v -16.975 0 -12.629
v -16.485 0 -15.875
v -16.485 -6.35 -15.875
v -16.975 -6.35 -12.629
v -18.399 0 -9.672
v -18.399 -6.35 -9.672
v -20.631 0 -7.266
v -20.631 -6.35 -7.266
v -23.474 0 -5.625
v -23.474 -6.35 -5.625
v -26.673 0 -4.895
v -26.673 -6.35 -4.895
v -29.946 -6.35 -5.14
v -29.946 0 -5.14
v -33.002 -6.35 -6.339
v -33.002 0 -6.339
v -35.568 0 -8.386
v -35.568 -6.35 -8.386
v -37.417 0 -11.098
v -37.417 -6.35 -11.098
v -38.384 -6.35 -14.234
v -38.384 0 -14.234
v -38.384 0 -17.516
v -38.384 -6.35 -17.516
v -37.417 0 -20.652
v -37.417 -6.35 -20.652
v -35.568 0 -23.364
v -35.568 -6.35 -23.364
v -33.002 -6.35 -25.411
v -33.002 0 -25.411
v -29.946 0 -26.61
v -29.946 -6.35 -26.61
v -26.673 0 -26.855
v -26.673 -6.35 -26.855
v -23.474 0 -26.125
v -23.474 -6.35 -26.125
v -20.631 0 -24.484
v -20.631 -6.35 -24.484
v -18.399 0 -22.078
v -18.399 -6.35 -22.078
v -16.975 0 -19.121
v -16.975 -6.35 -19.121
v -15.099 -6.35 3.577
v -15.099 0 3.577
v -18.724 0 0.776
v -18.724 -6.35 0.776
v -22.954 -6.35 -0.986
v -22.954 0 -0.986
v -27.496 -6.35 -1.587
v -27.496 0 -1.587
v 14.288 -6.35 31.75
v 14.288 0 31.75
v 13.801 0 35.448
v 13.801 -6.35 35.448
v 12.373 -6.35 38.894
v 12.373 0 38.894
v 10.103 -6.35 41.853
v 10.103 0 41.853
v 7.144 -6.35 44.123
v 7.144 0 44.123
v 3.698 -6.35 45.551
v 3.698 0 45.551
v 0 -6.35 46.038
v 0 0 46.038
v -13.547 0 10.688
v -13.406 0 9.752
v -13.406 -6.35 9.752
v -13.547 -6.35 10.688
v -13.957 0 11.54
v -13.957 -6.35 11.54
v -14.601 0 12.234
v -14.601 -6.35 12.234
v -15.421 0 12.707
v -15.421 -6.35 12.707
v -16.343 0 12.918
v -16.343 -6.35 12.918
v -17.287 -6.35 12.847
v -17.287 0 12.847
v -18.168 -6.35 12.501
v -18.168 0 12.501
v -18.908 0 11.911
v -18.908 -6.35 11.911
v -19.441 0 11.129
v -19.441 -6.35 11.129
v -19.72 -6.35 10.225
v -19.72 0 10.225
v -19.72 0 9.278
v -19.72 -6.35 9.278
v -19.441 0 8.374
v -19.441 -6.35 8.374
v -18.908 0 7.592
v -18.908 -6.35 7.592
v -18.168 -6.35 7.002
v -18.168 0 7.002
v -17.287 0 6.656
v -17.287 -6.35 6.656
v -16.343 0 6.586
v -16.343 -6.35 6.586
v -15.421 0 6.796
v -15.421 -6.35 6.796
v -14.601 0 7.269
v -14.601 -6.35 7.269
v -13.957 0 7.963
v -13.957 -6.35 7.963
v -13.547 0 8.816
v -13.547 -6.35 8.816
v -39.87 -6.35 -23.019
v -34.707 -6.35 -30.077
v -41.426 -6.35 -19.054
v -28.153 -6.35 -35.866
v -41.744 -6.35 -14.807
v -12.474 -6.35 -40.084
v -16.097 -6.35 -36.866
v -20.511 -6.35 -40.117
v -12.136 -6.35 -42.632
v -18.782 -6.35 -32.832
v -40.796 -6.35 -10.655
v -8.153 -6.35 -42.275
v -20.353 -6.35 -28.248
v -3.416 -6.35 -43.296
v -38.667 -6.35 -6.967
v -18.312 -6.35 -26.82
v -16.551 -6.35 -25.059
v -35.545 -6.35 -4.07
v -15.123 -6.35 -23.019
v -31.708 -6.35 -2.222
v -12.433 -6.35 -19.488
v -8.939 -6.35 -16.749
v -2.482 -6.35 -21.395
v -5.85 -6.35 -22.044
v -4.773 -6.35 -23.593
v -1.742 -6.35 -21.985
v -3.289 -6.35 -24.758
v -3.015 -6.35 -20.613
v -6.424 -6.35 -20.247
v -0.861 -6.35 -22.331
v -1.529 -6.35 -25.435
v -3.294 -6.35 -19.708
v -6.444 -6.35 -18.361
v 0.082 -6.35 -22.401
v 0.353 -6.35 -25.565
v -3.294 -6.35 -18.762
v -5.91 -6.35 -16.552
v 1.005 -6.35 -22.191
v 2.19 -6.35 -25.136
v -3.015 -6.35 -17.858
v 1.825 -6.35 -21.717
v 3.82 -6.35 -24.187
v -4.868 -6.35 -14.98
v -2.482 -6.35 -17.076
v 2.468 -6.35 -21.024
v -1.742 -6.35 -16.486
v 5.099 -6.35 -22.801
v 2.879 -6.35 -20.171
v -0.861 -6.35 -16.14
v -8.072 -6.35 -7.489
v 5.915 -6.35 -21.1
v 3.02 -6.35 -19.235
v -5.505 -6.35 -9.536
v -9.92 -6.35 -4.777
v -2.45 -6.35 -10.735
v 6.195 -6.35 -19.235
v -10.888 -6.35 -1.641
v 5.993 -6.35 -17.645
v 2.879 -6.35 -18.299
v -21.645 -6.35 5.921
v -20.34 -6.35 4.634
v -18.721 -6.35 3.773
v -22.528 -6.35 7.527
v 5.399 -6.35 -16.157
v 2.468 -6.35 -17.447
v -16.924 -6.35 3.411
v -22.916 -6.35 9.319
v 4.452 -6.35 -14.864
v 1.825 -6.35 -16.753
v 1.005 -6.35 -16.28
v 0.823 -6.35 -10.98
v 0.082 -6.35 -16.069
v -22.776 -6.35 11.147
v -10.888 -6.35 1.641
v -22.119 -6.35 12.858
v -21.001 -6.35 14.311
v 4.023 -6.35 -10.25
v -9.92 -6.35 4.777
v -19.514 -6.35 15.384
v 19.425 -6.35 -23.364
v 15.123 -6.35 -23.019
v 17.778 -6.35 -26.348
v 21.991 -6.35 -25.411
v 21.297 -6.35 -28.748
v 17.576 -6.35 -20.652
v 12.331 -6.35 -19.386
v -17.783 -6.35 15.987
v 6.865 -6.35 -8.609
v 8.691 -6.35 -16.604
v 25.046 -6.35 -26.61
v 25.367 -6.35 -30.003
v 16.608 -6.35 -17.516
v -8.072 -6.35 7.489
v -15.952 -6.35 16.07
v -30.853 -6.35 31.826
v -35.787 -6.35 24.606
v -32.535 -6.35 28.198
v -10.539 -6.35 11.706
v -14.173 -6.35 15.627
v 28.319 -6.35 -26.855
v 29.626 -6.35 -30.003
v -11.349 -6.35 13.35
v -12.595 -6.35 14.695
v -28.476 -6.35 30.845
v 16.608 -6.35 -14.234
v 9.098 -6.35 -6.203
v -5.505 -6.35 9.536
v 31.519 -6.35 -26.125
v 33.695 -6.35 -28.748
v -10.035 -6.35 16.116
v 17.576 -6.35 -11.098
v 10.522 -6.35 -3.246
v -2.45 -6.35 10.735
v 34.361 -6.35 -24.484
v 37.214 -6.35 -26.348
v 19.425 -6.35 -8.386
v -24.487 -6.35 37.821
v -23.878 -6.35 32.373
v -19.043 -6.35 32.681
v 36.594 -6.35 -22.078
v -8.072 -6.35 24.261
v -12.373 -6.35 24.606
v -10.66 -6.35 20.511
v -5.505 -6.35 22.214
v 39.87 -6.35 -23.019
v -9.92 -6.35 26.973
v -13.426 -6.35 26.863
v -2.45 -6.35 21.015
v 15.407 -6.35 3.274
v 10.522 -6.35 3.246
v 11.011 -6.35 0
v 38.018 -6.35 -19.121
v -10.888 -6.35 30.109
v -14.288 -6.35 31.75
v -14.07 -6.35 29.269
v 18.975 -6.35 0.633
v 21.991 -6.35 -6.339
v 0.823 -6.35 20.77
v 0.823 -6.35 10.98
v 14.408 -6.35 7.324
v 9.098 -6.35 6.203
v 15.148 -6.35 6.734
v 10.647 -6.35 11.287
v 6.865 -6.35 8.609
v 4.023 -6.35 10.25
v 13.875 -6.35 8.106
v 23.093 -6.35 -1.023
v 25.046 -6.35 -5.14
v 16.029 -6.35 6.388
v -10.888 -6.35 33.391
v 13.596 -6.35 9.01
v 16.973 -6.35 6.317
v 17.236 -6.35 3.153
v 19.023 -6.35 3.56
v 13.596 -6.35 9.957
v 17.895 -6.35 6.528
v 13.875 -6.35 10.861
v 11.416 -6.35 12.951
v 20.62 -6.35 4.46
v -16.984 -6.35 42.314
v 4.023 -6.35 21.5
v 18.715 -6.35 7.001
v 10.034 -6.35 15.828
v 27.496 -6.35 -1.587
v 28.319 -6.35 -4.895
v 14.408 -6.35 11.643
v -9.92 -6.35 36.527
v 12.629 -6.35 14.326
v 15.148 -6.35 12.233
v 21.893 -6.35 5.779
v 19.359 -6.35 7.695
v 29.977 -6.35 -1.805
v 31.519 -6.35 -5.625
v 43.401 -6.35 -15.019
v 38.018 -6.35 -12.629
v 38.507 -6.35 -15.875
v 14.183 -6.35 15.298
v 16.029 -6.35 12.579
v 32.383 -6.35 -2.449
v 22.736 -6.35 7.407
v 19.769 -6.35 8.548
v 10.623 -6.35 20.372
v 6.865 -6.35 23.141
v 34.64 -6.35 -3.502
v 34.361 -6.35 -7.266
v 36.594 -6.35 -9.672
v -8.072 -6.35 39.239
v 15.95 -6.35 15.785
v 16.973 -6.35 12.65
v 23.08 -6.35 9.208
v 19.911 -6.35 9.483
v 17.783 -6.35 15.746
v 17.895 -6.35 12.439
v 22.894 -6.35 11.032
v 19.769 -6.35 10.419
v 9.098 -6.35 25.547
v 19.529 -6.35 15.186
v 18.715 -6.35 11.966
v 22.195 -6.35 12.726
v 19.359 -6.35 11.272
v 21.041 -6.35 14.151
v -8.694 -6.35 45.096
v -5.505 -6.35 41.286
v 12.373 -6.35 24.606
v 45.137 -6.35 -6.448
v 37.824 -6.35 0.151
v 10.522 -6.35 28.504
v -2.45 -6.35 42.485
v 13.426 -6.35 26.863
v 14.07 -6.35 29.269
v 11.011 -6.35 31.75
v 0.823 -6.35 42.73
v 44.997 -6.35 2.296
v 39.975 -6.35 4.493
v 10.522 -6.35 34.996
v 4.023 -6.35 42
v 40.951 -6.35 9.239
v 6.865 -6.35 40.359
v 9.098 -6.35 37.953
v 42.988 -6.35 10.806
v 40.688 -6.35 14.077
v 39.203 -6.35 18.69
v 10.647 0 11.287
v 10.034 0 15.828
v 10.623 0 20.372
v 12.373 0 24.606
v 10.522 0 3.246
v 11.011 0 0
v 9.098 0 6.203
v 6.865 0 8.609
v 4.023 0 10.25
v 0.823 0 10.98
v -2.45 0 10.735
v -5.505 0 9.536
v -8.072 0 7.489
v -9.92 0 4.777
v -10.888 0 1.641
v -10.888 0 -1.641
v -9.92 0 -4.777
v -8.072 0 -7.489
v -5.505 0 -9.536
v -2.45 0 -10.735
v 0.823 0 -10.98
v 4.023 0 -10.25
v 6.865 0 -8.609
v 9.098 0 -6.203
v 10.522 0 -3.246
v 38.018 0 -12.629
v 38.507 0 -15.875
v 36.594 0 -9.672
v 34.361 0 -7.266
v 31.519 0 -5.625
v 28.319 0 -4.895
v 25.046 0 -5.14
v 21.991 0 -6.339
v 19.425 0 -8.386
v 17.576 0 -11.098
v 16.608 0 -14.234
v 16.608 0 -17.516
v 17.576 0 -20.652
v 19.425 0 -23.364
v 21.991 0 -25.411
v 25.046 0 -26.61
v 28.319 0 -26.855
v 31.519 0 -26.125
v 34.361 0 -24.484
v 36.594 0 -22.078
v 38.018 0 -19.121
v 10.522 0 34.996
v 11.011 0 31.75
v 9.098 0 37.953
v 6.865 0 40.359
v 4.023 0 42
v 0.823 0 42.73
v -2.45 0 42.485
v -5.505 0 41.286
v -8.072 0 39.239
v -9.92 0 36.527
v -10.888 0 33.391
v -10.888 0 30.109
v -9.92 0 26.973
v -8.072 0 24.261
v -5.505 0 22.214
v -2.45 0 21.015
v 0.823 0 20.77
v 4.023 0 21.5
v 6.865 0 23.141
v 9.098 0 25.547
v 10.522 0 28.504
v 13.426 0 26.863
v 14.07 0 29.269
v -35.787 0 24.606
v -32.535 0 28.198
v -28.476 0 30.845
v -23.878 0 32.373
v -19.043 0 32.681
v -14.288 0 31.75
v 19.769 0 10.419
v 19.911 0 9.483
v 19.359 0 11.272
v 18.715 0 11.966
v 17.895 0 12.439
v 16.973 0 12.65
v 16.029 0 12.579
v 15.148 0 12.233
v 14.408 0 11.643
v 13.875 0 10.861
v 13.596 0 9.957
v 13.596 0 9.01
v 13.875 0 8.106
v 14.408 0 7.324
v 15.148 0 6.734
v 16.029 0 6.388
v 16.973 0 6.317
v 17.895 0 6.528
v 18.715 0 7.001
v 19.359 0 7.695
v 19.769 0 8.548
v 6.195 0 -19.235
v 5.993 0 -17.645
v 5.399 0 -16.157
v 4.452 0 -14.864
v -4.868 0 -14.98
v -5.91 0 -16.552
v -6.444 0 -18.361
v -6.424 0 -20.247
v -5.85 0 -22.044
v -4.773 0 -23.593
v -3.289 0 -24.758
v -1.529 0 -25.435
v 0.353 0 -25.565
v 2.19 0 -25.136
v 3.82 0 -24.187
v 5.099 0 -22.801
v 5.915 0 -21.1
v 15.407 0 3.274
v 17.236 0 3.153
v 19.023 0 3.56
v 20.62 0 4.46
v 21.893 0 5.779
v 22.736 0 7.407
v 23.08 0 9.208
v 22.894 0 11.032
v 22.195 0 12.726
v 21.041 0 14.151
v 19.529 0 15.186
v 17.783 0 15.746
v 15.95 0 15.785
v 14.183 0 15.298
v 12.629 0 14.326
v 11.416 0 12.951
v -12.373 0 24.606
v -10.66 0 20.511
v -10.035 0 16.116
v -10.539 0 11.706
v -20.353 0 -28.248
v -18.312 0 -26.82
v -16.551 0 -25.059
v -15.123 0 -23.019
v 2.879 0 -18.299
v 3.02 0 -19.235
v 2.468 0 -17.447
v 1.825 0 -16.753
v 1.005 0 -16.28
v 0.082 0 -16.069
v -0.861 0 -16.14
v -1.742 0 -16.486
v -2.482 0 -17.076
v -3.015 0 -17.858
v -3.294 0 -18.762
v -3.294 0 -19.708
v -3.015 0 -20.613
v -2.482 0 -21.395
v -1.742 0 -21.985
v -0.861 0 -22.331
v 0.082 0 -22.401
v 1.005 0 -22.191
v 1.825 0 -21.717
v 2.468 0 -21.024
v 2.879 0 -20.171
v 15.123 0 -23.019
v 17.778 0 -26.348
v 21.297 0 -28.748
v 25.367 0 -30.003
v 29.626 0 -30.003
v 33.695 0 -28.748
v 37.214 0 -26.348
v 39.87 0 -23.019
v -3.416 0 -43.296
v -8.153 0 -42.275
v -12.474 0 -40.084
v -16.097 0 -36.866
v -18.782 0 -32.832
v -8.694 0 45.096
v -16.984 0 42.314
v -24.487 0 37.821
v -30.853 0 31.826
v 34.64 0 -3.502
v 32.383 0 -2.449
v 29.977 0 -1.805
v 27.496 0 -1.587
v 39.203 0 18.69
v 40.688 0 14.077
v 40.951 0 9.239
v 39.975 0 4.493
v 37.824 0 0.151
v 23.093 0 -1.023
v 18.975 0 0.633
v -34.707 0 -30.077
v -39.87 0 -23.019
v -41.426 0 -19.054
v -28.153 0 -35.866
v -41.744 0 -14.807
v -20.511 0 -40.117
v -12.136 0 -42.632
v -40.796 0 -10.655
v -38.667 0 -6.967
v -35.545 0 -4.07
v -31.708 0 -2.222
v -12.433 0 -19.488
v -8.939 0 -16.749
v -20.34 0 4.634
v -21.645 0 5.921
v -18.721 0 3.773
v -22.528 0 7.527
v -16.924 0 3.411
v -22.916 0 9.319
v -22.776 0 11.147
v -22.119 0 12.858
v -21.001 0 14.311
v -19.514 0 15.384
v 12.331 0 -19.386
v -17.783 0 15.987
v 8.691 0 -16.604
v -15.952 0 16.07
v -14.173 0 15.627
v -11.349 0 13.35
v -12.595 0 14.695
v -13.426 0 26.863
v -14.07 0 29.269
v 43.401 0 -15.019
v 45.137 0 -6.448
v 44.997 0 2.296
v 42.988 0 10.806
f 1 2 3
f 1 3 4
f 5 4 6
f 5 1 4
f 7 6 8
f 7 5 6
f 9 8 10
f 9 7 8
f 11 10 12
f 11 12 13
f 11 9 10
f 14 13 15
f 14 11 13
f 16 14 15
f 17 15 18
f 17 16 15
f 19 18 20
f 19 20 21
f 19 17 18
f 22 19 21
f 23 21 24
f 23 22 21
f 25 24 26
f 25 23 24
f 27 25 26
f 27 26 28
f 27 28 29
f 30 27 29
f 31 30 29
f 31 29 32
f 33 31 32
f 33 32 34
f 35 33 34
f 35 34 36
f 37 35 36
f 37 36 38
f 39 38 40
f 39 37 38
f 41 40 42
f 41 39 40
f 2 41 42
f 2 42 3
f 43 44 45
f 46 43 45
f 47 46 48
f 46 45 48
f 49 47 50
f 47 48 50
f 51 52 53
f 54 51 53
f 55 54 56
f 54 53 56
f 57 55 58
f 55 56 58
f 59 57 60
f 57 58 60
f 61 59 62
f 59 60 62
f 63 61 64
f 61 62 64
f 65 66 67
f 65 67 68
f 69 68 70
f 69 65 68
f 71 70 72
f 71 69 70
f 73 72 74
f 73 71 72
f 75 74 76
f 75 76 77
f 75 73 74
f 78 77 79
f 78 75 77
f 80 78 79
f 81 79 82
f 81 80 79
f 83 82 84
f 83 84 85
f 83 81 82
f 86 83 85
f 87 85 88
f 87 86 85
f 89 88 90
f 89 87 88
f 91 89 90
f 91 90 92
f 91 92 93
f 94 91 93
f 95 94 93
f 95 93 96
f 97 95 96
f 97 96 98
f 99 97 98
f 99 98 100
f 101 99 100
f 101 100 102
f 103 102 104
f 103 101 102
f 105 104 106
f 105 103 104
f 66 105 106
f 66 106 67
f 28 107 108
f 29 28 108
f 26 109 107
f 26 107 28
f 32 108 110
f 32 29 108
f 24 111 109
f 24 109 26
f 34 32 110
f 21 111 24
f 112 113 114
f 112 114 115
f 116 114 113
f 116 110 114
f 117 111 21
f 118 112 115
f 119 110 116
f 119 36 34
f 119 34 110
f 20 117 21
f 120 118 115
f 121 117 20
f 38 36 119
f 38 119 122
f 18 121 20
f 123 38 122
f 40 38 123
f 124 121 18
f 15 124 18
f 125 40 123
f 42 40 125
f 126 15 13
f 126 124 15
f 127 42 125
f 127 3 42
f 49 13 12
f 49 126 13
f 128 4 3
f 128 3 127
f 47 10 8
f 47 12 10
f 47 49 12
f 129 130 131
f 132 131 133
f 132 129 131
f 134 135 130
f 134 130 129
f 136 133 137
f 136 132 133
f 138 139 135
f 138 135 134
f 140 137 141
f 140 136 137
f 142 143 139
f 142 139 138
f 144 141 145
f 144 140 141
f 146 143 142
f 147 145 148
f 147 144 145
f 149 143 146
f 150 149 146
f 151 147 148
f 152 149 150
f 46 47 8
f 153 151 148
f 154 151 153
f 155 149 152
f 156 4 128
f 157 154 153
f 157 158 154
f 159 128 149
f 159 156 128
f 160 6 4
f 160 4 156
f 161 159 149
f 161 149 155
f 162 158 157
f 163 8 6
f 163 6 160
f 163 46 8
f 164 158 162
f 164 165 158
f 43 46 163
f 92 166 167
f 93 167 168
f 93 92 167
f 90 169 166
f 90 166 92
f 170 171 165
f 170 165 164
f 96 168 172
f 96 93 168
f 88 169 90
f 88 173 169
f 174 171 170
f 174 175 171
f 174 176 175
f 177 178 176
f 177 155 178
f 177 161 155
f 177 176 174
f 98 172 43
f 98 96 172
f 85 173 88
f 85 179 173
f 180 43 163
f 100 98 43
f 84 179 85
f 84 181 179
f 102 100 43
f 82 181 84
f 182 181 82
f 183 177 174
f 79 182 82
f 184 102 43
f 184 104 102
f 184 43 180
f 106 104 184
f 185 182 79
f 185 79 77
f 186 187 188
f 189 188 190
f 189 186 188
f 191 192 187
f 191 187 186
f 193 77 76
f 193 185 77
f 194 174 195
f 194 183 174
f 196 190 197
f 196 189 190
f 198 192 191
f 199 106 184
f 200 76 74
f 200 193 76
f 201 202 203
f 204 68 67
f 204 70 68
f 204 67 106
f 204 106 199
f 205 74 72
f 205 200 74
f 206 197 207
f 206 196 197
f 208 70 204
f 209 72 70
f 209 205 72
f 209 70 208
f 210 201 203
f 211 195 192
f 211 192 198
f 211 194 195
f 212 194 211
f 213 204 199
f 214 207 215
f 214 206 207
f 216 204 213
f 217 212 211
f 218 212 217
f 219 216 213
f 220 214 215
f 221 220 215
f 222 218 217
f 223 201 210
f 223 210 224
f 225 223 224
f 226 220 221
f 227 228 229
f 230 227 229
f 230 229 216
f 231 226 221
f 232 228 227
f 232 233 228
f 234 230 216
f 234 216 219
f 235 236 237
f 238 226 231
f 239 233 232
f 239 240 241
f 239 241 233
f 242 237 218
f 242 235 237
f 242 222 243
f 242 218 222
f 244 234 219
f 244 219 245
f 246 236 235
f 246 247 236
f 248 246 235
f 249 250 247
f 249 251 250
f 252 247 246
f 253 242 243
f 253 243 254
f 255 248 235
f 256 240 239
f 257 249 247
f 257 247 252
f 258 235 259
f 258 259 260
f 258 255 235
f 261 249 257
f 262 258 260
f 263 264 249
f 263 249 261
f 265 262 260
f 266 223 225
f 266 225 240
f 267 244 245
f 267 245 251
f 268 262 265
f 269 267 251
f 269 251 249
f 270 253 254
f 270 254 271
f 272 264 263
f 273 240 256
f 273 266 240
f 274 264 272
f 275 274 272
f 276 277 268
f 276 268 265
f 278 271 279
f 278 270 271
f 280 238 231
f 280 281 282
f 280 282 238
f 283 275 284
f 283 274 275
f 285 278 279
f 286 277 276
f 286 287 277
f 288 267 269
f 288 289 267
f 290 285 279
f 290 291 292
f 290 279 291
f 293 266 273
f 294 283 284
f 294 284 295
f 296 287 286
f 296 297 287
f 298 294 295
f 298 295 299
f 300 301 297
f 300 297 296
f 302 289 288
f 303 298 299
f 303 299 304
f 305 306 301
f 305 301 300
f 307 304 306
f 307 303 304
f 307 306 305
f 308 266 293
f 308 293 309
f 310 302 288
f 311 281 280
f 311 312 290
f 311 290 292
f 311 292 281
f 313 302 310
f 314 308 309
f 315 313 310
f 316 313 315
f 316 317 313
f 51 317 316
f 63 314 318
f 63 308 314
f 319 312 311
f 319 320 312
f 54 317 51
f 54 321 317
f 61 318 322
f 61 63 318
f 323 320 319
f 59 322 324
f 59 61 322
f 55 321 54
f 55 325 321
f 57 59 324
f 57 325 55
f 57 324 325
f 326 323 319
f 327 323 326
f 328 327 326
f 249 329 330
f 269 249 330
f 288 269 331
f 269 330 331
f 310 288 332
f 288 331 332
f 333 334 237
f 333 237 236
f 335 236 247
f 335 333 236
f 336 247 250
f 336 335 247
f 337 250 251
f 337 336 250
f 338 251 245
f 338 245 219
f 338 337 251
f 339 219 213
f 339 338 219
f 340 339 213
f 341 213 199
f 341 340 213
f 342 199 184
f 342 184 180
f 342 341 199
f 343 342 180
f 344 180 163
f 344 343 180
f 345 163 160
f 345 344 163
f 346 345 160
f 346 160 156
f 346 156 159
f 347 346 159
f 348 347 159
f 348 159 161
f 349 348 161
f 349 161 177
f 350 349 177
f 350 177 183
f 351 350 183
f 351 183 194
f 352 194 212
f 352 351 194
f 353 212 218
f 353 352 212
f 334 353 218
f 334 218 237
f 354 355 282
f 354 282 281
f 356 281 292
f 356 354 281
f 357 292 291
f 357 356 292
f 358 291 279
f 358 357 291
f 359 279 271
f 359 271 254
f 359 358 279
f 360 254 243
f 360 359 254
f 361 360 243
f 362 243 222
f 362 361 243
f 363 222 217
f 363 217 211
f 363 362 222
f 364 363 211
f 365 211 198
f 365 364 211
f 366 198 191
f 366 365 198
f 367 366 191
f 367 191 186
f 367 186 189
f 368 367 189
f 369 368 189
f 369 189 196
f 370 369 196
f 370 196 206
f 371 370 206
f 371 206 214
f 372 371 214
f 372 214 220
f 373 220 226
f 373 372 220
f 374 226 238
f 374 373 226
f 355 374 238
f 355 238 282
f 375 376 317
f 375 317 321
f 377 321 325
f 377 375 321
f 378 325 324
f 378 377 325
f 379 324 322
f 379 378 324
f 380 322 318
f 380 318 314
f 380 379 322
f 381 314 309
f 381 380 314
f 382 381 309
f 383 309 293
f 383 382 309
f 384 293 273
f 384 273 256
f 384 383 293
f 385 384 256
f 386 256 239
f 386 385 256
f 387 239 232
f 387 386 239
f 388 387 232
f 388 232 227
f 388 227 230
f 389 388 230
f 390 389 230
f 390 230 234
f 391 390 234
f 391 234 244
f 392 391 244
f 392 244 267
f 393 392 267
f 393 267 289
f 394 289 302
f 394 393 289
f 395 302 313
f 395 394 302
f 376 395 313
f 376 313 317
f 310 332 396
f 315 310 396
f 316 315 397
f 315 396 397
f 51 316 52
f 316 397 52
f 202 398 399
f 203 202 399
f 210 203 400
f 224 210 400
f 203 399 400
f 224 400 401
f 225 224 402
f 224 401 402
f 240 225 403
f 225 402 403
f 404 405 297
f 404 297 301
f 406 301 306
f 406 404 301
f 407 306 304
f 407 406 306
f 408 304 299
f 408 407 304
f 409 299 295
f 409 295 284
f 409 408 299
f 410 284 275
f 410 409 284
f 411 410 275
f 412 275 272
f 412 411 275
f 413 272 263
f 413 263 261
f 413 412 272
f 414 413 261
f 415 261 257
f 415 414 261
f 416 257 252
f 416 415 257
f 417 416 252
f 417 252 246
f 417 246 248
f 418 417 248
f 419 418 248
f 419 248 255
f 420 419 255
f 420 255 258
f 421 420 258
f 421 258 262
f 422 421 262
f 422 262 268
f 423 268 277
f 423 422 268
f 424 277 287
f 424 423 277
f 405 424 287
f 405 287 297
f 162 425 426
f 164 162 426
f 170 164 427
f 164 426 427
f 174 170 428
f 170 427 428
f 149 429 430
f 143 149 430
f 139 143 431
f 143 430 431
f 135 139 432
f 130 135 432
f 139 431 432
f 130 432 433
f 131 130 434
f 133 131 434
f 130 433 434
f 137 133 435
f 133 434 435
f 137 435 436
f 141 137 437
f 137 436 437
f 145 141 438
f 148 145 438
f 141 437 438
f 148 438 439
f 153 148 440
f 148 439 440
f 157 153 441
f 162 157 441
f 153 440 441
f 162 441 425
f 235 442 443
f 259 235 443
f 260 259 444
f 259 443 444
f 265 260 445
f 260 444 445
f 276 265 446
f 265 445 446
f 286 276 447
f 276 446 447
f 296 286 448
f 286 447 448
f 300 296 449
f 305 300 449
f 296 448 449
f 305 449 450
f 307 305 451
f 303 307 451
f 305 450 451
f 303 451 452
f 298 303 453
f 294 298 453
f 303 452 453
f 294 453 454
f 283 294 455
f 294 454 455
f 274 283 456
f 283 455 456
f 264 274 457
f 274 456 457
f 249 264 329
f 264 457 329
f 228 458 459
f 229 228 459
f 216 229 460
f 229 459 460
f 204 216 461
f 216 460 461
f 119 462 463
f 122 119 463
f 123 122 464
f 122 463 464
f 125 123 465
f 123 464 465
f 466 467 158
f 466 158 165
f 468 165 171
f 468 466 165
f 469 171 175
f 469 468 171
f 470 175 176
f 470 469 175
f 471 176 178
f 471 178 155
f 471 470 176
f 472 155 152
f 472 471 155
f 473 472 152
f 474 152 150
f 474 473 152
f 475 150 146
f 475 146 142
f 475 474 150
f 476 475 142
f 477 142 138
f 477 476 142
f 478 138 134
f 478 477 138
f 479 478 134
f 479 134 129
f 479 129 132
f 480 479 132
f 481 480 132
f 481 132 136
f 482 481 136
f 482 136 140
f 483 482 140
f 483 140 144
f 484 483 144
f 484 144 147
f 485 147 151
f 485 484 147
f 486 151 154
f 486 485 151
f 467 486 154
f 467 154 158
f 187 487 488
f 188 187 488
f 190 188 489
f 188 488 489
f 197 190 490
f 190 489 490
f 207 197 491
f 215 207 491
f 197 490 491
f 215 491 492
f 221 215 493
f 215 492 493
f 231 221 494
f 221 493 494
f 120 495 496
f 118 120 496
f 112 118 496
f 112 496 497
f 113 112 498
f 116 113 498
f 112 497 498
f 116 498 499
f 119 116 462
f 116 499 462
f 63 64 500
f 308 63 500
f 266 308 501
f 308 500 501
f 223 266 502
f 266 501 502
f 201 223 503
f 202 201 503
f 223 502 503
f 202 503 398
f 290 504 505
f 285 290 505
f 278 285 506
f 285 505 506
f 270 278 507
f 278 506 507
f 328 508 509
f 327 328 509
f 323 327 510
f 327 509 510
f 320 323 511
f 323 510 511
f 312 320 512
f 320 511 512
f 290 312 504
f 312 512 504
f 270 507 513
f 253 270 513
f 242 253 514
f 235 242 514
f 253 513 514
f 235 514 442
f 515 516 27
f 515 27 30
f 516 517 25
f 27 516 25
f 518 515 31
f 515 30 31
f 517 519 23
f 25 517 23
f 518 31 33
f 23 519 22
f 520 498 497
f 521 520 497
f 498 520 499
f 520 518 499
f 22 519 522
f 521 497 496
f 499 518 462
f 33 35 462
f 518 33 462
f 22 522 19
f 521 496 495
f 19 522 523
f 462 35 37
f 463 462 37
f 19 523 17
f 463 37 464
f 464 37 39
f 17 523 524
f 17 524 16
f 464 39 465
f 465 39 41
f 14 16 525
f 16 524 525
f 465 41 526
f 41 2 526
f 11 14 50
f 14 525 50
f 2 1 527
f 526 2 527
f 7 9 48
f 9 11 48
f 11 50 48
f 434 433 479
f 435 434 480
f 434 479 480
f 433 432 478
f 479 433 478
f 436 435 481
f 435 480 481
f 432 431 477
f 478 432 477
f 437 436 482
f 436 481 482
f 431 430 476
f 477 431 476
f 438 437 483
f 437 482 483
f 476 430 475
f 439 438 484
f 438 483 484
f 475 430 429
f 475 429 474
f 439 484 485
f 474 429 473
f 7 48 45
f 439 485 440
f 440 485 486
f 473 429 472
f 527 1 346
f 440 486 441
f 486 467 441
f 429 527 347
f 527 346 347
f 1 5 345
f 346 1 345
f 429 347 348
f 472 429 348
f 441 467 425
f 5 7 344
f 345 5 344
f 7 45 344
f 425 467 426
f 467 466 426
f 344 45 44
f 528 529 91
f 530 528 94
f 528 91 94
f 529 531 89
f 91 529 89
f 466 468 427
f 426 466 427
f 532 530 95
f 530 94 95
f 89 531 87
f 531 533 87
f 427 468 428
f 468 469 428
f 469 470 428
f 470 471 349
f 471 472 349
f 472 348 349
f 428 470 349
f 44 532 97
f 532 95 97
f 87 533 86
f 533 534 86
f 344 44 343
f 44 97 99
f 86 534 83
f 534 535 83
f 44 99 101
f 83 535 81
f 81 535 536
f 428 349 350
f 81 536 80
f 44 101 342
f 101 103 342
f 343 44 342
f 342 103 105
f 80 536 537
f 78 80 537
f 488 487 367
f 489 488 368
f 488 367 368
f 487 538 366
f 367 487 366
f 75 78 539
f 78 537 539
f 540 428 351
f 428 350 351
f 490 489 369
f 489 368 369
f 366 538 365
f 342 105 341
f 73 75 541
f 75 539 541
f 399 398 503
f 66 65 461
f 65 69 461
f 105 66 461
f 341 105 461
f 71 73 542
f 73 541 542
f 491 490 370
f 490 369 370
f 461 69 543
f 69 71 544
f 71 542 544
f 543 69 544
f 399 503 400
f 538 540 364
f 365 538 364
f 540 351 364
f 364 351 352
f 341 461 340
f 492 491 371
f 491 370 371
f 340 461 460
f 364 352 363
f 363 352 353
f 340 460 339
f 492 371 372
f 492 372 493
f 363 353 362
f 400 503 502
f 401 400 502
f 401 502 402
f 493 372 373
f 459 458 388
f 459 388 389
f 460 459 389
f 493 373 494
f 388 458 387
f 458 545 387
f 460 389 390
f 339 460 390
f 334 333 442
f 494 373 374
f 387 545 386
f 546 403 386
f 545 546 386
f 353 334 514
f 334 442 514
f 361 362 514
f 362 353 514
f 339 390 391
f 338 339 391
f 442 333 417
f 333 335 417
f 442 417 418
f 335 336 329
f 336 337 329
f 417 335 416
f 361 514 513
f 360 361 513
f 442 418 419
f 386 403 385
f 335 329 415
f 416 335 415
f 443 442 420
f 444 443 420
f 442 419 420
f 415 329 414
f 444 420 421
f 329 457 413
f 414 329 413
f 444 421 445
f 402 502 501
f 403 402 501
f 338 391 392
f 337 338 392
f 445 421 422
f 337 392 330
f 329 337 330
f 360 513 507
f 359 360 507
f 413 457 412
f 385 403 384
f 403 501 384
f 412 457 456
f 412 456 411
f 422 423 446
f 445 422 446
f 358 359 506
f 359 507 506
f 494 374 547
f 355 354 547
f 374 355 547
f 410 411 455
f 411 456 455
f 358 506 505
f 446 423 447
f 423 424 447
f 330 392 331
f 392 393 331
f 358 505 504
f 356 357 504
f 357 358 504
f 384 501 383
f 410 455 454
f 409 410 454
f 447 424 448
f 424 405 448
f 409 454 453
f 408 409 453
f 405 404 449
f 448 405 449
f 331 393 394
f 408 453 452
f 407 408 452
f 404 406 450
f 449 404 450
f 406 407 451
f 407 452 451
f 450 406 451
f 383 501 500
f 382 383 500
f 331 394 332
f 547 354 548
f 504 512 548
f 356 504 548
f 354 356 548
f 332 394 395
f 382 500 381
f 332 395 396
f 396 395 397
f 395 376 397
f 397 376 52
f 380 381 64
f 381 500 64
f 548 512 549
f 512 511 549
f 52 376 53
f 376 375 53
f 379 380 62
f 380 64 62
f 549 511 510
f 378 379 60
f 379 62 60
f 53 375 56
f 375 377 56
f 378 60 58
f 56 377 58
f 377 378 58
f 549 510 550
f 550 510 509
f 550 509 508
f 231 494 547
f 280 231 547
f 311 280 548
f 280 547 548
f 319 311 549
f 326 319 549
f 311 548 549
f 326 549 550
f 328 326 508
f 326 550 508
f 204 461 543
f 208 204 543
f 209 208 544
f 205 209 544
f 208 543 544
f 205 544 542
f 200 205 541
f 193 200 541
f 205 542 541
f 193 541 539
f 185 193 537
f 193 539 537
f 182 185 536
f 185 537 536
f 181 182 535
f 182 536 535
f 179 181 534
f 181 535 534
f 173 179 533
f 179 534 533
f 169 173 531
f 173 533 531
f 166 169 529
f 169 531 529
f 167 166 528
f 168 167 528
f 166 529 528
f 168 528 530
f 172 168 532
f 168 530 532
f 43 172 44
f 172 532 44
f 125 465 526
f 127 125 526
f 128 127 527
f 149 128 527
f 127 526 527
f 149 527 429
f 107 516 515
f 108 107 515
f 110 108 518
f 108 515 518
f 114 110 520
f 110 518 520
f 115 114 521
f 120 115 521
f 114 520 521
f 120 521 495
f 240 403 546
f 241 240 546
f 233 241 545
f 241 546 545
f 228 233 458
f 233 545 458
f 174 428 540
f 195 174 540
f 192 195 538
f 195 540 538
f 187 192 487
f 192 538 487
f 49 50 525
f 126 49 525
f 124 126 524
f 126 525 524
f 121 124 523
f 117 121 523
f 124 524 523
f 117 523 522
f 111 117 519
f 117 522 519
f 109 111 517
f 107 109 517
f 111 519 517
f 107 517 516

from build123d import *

# Parameters (mm, degrees)
F0_R     = 11.0109
F0_R_2   = 3.175
F1_DEPTH = 6.35


with BuildPart() as f1:
    # F0 (on Front) → F1 (new body)
    with BuildSketch(Plane.XZ):
        with BuildLine():
            ThreePointArc((12.3733379566, 24.60625), (13.8006652431, 28.0521228931), (14.2875, 31.75))
            ThreePointArc((14.2875, 31.75), (10.1027881362, 41.8527881362), (0, 46.0375))
            ThreePointArc((0, 46.0375), (-10.1027881362, 41.8527881362), (-14.2875, 31.75))
            ThreePointArc((-14.2875, 31.75), (-13.8006652431, 28.0521228931), (-12.3733379566, 24.60625))
            ThreePointArc((-12.3733379566, 24.60625), (0, 17.4625), (12.3733379566, 24.60625))
        make_face()
        with Locations((0, 31.75)):
            Circle(F0_R, mode=Mode.SUBTRACT)
        with BuildLine():
            ThreePointArc((-14.2875, 31.75), (-10.1027881362, 41.8527881362), (0, 46.0375))
            ThreePointArc((0, 46.0375), (-20.8568006936, 40.269983922), (-35.7872332561, 24.60625))
            ThreePointArc((-35.7872332561, 24.60625), (-26.2265027578, 31.7569329924), (-14.2875, 31.75))
        make_face()
        with BuildLine():
            ThreePointArc((10.6471746219, 11.2874452221), (10.1786438017, 18.1194292121), (12.3733379566, 24.60625))
            ThreePointArc((12.3733379566, 24.60625), (0, 17.4625), (-12.3733379566, 24.60625))
            ThreePointArc((-12.3733379566, 24.60625), (-10.2077366082, 18.3335066447), (-10.5388292946, 11.7057230006))
            ThreePointArc((-10.5388292946, 11.7057230006), (-10.3260856779, 10.8481793102), (-10.2344309309, 9.9694071925))
            ThreePointArc((-10.2344309309, 9.9694071925), (0.1150101412, 14.2870370937), (10.3936009423, 9.8033522686))
            ThreePointArc((10.3936009423, 9.8033522686), (10.4762468955, 10.5529407036), (10.6471746219, 11.2874452221))
        make_face()
        with BuildLine():
            ThreePointArc((23.0855388403, 9.4834715128), (17.6469627848, 15.7677221756), (10.6471746219, 11.2874452221))
            ThreePointArc((10.6471746219, 11.2874452221), (11.3765560575, 9.1599013663), (12.3733379177, 7.1437500673))
            ThreePointArc((12.3733379177, 7.1437500673), (13.7532190864, 5.1015858399), (15.4068681354, 3.274032395))
            ThreePointArc((15.4068681354, 3.274032395), (20.7283724847, 4.5458830844), (23.0855388403, 9.4834715128))
        make_face()
        with Locations((16.7355388403, 9.4834715128)):
            Circle(F0_R_2, mode=Mode.SUBTRACT)
        with BuildLine():
            ThreePointArc((12.3733379177, 7.1437500673), (11.3765560575, 9.1599013663), (10.6471746219, 11.2874452221))
            ThreePointArc((10.6471746219, 11.2874452221), (10.4762468955, 10.5529407036), (10.3936009423, 9.8033522686))
            ThreePointArc((10.3936009423, 9.8033522686), (11.4608789903, 8.531172781), (12.3733379177, 7.1437500673))
        make_face()
        with BuildLine():
            ThreePointArc((-10.2344309309, 9.9694071925), (-10.3260856779, 10.8481793102), (-10.5388292946, 11.7057230006))
            ThreePointArc((-10.5388292946, 11.7057230006), (-11.2947124555, 9.359844254), (-12.3733379294, 7.1437500471))
            ThreePointArc((-12.3733379294, 7.1437500471), (-11.3918342591, 8.6231530466), (-10.2344309309, 9.9694071925))
        make_face()
        with BuildLine():
            ThreePointArc((-12.3733379294, 7.1437500471), (-11.2947124555, 9.359844254), (-10.5388292946, 11.7057230006))
            ThreePointArc((-10.5388292946, 11.7057230006), (-22.1188173057, 12.8583877354), (-15.0988016171, 3.57700109))
            ThreePointArc((-15.0988016171, 3.57700109), (-13.620985268, 5.2724359227), (-12.3733379294, 7.1437500471))
        make_face()
        with Locations((-16.5806966663, 9.7516660253)):
            Circle(F0_R_2, mode=Mode.SUBTRACT)
        with BuildLine():
            ThreePointArc((15.4068681354, 3.274032395), (13.7532190864, 5.1015858399), (12.3733379177, 7.1437500673))
            ThreePointArc((12.3733379177, 7.1437500673), (13.1637867029, 5.5540414017), (13.7509753549, 3.8785735832))
            ThreePointArc((13.7509753549, 3.8785735832), (14.5578417064, 3.5185628636), (15.4068681354, 3.274032395))
        make_face()
        with BuildLine():
            ThreePointArc((-13.686752578, 4.0994463185), (-13.1186518214, 5.6598260255), (-12.3733379294, 7.1437500471))
            ThreePointArc((-12.3733379294, 7.1437500471), (-13.620985268, 5.2724359227), (-15.0988016171, 3.57700109))
            ThreePointArc((-15.0988016171, 3.57700109), (-14.3772381817, 3.796225596), (-13.686752578, 4.0994463185))
        make_face()
        with BuildLine():
            ThreePointArc((-13.686752578, 4.0994463185), (-14.3772381817, 3.796225596), (-15.0988016171, 3.57700109))
            ThreePointArc((-15.0988016171, 3.57700109), (-20.7812079006, -0.2447504977), (-27.4963065702, -1.5875))
            ThreePointArc((-27.4963065702, -1.5875), (-17.393518434, -5.7722118638), (-13.2088065702, -15.875))
            ThreePointArc((-13.2088065702, -15.875), (-13.6956413271, -19.5728771069), (-15.1229686136, -23.01875))
            ThreePointArc((-15.1229686136, -23.01875), (-10.7734141907, -18.0069125403), (-4.8680388409, -14.9797553955))
            ThreePointArc((-4.8680388409, -14.9797553955), (-4.2317560285, -14.3667421738), (-3.5165444239, -13.8479807757))
            ThreePointArc((-3.5165444239, -13.8479807757), (-12.4304421386, -7.0439168429), (-13.686752578, 4.0994463185))
        make_face()
        with BuildLine():
            ThreePointArc((15.4068681354, 3.274032395), (14.5578417064, 3.5185628636), (13.7509753549, 3.8785735832))
            ThreePointArc((13.7509753549, 3.8785735832), (14.1527332454, 1.9577532873), (14.2875, 0))
            ThreePointArc((14.2875, 0), (11.2067738499, -8.8623290464), (3.2931516357, -13.9027985871))
            ThreePointArc((3.2931516357, -13.9027985871), (3.9009912862, -14.3491662996), (4.4516269953, -14.8644463122))
            ThreePointArc((4.4516269953, -14.8644463122), (10.6025640989, -17.8746787144), (15.1229686136, -23.01875))
            ThreePointArc((15.1229686136, -23.01875), (15.1229686136, -8.73125), (27.4963065702, -1.5875))
            ThreePointArc((27.4963065702, -1.5875), (20.9811507989, -0.3265941045), (15.4068681354, 3.274032395))
        make_face()
        with BuildLine():
            ThreePointArc((-13.2088065702, -15.875), (-17.393518434, -5.7722118638), (-27.4963065702, -1.5875))
            ThreePointArc((-27.4963065702, -1.5875), (-39.8696445267, -8.73125), (-39.8696445267, -23.01875))
            ThreePointArc((-39.8696445267, -23.01875), (-31.1941836771, -29.6756652431), (-20.3525565702, -28.2483379566))
            ThreePointArc((-20.3525565702, -28.2483379566), (-17.393518434, -25.9777881362), (-15.1229686136, -23.01875))
            ThreePointArc((-15.1229686136, -23.01875), (-13.6956413271, -19.5728771069), (-13.2088065702, -15.875))
        make_face()
        with Locations((-27.4963065702, -15.875)):
            Circle(F0_R, mode=Mode.SUBTRACT)
        with BuildLine():
            ThreePointArc((34.6400565702, -3.5016620434), (31.1941836771, -2.0743347569), (27.4963065702, -1.5875))
            ThreePointArc((27.4963065702, -1.5875), (15.1229686136, -8.73125), (15.1229686136, -23.01875))
            ThreePointArc((15.1229686136, -23.01875), (27.4963065702, -30.1625), (39.8696445267, -23.01875))
            ThreePointArc((39.8696445267, -23.01875), (41.2969718133, -19.5728771069), (41.7838065702, -15.875))
            ThreePointArc((41.7838065702, -15.875), (39.8696445267, -8.73125), (34.6400565702, -3.5016620434))
        make_face()
        with Locations((27.4963065702, -15.875)):
            Circle(F0_R, mode=Mode.SUBTRACT)
        with BuildLine():
            ThreePointArc((-5.5e-09, -14.2875), (-1.7719524453, -14.1771943903), (-3.5165444239, -13.8479807757))
            ThreePointArc((-3.5165444239, -13.8479807757), (-4.2317560285, -14.3667421738), (-4.8680388409, -14.9797553955))
            ThreePointArc((-4.8680388409, -14.9797553955), (-2.4585066475, -14.4614300385), (-5.5e-09, -14.2875))
        make_face()
        with BuildLine():
            ThreePointArc((-20.3525565702, -28.2483379566), (-31.1941836771, -29.6756652431), (-39.8696445267, -23.01875))
            ThreePointArc((-39.8696445267, -23.01875), (-24.4464287396, -38.1975112033), (-3.4160209638, -43.2957781309))
            ThreePointArc((-3.4160209638, -43.2957781309), (-14.3890593388, -38.5912841369), (-20.3525565702, -28.2483379566))
        make_face()
        with BuildLine():
            ThreePointArc((4.4516269953, -14.8644463122), (3.9009912862, -14.3491662996), (3.2931516357, -13.9027985871))
            ThreePointArc((3.2931516357, -13.9027985871), (1.6577728159, -14.1909987506), (-5.5e-09, -14.2875))
            ThreePointArc((-5.5e-09, -14.2875), (2.2444292093, -14.4323372312), (4.4516269953, -14.8644463122))
        make_face()
        with BuildLine():
            ThreePointArc((39.2032542199, 18.6895281309), (40.6155620966, 6.8343511445), (34.6400565702, -3.5016620434))
            ThreePointArc((34.6400565702, -3.5016620434), (39.8696445267, -8.73125), (41.7838065702, -15.875))
            ThreePointArc((41.7838065702, -15.875), (41.2969718133, -19.5728771069), (39.8696445267, -23.01875))
            ThreePointArc((39.8696445267, -23.01875), (45.3032294332, -2.0724727187), (39.2032542199, 18.6895281309))
        make_face()
        with BuildLine():
            ThreePointArc((4.4516269953, -14.8644463122), (2.2444292093, -14.4323372312), (-5.5e-09, -14.2875))
            ThreePointArc((-5.5e-09, -14.2875), (-2.4585066475, -14.4614300385), (-4.8680388409, -14.9797553955))
            ThreePointArc((-4.8680388409, -14.9797553955), (-2.4345023642, -25.1618271215), (6.195157826, -19.2351375381))
            ThreePointArc((6.195157826, -19.2351375381), (5.743190516, -16.8823284962), (4.4516269953, -14.8644463122))
        make_face()
        with Locations((-0.154842174, -19.2351375381)):
            Circle(F0_R_2, mode=Mode.SUBTRACT)
        with BuildLine():
            ThreePointArc((13.7509753549, 3.8785735832), (11.2108978898, 6.3528418048), (10.3936009423, 9.8033522686))
            ThreePointArc((10.3936009423, 9.8033522686), (0.1150101412, 14.2870370937), (-10.2344309309, 9.9694071925))
            ThreePointArc((-10.2344309309, 9.9694071925), (-10.2316303011, 9.8605526184), (-10.2306966663, 9.7516660253))
            ThreePointArc((-10.2306966663, 9.7516660253), (-11.1631767097, 6.4391175321), (-13.686752578, 4.0994463185))
            ThreePointArc((-13.686752578, 4.0994463185), (-12.4304421386, -7.0439168429), (-3.5165444239, -13.8479807757))
            ThreePointArc((-3.5165444239, -13.8479807757), (-0.1037265557, -12.8853432742), (3.2931516357, -13.9027985871))
            ThreePointArc((3.2931516357, -13.9027985871), (11.2067738499, -8.8623290464), (14.2875, 0))
            ThreePointArc((14.2875, 0), (14.1527332454, 1.9577532873), (13.7509753549, 3.8785735832))
        make_face()
        Circle(F0_R, mode=Mode.SUBTRACT)
        with BuildLine():
            ThreePointArc((3.2931516357, -13.9027985871), (-0.1037265557, -12.8853432742), (-3.5165444239, -13.8479807757))
            ThreePointArc((-3.5165444239, -13.8479807757), (-1.7719524453, -14.1771943903), (-5.5e-09, -14.2875))
            ThreePointArc((-5.5e-09, -14.2875), (1.6577728159, -14.1909987506), (3.2931516357, -13.9027985871))
        make_face()
        with BuildLine():
            ThreePointArc((-10.2344309309, 9.9694071925), (-11.3918342591, 8.6231530466), (-12.3733379294, 7.1437500471))
            ThreePointArc((-12.3733379294, 7.1437500471), (-13.1186518214, 5.6598260255), (-13.686752578, 4.0994463185))
            ThreePointArc((-13.686752578, 4.0994463185), (-11.1631767097, 6.4391175321), (-10.2306966663, 9.7516660253))
            ThreePointArc((-10.2306966663, 9.7516660253), (-10.2316303011, 9.8605526184), (-10.2344309309, 9.9694071925))
        make_face()
        with BuildLine():
            ThreePointArc((13.7509753549, 3.8785735832), (13.1637867029, 5.5540414017), (12.3733379177, 7.1437500673))
            ThreePointArc((12.3733379177, 7.1437500673), (11.4608789903, 8.531172781), (10.3936009423, 9.8033522686))
            ThreePointArc((10.3936009423, 9.8033522686), (11.2108978898, 6.3528418048), (13.7509753549, 3.8785735832))
        make_face()
    extrude(amount=F1_DEPTH)


solid = f1.part
